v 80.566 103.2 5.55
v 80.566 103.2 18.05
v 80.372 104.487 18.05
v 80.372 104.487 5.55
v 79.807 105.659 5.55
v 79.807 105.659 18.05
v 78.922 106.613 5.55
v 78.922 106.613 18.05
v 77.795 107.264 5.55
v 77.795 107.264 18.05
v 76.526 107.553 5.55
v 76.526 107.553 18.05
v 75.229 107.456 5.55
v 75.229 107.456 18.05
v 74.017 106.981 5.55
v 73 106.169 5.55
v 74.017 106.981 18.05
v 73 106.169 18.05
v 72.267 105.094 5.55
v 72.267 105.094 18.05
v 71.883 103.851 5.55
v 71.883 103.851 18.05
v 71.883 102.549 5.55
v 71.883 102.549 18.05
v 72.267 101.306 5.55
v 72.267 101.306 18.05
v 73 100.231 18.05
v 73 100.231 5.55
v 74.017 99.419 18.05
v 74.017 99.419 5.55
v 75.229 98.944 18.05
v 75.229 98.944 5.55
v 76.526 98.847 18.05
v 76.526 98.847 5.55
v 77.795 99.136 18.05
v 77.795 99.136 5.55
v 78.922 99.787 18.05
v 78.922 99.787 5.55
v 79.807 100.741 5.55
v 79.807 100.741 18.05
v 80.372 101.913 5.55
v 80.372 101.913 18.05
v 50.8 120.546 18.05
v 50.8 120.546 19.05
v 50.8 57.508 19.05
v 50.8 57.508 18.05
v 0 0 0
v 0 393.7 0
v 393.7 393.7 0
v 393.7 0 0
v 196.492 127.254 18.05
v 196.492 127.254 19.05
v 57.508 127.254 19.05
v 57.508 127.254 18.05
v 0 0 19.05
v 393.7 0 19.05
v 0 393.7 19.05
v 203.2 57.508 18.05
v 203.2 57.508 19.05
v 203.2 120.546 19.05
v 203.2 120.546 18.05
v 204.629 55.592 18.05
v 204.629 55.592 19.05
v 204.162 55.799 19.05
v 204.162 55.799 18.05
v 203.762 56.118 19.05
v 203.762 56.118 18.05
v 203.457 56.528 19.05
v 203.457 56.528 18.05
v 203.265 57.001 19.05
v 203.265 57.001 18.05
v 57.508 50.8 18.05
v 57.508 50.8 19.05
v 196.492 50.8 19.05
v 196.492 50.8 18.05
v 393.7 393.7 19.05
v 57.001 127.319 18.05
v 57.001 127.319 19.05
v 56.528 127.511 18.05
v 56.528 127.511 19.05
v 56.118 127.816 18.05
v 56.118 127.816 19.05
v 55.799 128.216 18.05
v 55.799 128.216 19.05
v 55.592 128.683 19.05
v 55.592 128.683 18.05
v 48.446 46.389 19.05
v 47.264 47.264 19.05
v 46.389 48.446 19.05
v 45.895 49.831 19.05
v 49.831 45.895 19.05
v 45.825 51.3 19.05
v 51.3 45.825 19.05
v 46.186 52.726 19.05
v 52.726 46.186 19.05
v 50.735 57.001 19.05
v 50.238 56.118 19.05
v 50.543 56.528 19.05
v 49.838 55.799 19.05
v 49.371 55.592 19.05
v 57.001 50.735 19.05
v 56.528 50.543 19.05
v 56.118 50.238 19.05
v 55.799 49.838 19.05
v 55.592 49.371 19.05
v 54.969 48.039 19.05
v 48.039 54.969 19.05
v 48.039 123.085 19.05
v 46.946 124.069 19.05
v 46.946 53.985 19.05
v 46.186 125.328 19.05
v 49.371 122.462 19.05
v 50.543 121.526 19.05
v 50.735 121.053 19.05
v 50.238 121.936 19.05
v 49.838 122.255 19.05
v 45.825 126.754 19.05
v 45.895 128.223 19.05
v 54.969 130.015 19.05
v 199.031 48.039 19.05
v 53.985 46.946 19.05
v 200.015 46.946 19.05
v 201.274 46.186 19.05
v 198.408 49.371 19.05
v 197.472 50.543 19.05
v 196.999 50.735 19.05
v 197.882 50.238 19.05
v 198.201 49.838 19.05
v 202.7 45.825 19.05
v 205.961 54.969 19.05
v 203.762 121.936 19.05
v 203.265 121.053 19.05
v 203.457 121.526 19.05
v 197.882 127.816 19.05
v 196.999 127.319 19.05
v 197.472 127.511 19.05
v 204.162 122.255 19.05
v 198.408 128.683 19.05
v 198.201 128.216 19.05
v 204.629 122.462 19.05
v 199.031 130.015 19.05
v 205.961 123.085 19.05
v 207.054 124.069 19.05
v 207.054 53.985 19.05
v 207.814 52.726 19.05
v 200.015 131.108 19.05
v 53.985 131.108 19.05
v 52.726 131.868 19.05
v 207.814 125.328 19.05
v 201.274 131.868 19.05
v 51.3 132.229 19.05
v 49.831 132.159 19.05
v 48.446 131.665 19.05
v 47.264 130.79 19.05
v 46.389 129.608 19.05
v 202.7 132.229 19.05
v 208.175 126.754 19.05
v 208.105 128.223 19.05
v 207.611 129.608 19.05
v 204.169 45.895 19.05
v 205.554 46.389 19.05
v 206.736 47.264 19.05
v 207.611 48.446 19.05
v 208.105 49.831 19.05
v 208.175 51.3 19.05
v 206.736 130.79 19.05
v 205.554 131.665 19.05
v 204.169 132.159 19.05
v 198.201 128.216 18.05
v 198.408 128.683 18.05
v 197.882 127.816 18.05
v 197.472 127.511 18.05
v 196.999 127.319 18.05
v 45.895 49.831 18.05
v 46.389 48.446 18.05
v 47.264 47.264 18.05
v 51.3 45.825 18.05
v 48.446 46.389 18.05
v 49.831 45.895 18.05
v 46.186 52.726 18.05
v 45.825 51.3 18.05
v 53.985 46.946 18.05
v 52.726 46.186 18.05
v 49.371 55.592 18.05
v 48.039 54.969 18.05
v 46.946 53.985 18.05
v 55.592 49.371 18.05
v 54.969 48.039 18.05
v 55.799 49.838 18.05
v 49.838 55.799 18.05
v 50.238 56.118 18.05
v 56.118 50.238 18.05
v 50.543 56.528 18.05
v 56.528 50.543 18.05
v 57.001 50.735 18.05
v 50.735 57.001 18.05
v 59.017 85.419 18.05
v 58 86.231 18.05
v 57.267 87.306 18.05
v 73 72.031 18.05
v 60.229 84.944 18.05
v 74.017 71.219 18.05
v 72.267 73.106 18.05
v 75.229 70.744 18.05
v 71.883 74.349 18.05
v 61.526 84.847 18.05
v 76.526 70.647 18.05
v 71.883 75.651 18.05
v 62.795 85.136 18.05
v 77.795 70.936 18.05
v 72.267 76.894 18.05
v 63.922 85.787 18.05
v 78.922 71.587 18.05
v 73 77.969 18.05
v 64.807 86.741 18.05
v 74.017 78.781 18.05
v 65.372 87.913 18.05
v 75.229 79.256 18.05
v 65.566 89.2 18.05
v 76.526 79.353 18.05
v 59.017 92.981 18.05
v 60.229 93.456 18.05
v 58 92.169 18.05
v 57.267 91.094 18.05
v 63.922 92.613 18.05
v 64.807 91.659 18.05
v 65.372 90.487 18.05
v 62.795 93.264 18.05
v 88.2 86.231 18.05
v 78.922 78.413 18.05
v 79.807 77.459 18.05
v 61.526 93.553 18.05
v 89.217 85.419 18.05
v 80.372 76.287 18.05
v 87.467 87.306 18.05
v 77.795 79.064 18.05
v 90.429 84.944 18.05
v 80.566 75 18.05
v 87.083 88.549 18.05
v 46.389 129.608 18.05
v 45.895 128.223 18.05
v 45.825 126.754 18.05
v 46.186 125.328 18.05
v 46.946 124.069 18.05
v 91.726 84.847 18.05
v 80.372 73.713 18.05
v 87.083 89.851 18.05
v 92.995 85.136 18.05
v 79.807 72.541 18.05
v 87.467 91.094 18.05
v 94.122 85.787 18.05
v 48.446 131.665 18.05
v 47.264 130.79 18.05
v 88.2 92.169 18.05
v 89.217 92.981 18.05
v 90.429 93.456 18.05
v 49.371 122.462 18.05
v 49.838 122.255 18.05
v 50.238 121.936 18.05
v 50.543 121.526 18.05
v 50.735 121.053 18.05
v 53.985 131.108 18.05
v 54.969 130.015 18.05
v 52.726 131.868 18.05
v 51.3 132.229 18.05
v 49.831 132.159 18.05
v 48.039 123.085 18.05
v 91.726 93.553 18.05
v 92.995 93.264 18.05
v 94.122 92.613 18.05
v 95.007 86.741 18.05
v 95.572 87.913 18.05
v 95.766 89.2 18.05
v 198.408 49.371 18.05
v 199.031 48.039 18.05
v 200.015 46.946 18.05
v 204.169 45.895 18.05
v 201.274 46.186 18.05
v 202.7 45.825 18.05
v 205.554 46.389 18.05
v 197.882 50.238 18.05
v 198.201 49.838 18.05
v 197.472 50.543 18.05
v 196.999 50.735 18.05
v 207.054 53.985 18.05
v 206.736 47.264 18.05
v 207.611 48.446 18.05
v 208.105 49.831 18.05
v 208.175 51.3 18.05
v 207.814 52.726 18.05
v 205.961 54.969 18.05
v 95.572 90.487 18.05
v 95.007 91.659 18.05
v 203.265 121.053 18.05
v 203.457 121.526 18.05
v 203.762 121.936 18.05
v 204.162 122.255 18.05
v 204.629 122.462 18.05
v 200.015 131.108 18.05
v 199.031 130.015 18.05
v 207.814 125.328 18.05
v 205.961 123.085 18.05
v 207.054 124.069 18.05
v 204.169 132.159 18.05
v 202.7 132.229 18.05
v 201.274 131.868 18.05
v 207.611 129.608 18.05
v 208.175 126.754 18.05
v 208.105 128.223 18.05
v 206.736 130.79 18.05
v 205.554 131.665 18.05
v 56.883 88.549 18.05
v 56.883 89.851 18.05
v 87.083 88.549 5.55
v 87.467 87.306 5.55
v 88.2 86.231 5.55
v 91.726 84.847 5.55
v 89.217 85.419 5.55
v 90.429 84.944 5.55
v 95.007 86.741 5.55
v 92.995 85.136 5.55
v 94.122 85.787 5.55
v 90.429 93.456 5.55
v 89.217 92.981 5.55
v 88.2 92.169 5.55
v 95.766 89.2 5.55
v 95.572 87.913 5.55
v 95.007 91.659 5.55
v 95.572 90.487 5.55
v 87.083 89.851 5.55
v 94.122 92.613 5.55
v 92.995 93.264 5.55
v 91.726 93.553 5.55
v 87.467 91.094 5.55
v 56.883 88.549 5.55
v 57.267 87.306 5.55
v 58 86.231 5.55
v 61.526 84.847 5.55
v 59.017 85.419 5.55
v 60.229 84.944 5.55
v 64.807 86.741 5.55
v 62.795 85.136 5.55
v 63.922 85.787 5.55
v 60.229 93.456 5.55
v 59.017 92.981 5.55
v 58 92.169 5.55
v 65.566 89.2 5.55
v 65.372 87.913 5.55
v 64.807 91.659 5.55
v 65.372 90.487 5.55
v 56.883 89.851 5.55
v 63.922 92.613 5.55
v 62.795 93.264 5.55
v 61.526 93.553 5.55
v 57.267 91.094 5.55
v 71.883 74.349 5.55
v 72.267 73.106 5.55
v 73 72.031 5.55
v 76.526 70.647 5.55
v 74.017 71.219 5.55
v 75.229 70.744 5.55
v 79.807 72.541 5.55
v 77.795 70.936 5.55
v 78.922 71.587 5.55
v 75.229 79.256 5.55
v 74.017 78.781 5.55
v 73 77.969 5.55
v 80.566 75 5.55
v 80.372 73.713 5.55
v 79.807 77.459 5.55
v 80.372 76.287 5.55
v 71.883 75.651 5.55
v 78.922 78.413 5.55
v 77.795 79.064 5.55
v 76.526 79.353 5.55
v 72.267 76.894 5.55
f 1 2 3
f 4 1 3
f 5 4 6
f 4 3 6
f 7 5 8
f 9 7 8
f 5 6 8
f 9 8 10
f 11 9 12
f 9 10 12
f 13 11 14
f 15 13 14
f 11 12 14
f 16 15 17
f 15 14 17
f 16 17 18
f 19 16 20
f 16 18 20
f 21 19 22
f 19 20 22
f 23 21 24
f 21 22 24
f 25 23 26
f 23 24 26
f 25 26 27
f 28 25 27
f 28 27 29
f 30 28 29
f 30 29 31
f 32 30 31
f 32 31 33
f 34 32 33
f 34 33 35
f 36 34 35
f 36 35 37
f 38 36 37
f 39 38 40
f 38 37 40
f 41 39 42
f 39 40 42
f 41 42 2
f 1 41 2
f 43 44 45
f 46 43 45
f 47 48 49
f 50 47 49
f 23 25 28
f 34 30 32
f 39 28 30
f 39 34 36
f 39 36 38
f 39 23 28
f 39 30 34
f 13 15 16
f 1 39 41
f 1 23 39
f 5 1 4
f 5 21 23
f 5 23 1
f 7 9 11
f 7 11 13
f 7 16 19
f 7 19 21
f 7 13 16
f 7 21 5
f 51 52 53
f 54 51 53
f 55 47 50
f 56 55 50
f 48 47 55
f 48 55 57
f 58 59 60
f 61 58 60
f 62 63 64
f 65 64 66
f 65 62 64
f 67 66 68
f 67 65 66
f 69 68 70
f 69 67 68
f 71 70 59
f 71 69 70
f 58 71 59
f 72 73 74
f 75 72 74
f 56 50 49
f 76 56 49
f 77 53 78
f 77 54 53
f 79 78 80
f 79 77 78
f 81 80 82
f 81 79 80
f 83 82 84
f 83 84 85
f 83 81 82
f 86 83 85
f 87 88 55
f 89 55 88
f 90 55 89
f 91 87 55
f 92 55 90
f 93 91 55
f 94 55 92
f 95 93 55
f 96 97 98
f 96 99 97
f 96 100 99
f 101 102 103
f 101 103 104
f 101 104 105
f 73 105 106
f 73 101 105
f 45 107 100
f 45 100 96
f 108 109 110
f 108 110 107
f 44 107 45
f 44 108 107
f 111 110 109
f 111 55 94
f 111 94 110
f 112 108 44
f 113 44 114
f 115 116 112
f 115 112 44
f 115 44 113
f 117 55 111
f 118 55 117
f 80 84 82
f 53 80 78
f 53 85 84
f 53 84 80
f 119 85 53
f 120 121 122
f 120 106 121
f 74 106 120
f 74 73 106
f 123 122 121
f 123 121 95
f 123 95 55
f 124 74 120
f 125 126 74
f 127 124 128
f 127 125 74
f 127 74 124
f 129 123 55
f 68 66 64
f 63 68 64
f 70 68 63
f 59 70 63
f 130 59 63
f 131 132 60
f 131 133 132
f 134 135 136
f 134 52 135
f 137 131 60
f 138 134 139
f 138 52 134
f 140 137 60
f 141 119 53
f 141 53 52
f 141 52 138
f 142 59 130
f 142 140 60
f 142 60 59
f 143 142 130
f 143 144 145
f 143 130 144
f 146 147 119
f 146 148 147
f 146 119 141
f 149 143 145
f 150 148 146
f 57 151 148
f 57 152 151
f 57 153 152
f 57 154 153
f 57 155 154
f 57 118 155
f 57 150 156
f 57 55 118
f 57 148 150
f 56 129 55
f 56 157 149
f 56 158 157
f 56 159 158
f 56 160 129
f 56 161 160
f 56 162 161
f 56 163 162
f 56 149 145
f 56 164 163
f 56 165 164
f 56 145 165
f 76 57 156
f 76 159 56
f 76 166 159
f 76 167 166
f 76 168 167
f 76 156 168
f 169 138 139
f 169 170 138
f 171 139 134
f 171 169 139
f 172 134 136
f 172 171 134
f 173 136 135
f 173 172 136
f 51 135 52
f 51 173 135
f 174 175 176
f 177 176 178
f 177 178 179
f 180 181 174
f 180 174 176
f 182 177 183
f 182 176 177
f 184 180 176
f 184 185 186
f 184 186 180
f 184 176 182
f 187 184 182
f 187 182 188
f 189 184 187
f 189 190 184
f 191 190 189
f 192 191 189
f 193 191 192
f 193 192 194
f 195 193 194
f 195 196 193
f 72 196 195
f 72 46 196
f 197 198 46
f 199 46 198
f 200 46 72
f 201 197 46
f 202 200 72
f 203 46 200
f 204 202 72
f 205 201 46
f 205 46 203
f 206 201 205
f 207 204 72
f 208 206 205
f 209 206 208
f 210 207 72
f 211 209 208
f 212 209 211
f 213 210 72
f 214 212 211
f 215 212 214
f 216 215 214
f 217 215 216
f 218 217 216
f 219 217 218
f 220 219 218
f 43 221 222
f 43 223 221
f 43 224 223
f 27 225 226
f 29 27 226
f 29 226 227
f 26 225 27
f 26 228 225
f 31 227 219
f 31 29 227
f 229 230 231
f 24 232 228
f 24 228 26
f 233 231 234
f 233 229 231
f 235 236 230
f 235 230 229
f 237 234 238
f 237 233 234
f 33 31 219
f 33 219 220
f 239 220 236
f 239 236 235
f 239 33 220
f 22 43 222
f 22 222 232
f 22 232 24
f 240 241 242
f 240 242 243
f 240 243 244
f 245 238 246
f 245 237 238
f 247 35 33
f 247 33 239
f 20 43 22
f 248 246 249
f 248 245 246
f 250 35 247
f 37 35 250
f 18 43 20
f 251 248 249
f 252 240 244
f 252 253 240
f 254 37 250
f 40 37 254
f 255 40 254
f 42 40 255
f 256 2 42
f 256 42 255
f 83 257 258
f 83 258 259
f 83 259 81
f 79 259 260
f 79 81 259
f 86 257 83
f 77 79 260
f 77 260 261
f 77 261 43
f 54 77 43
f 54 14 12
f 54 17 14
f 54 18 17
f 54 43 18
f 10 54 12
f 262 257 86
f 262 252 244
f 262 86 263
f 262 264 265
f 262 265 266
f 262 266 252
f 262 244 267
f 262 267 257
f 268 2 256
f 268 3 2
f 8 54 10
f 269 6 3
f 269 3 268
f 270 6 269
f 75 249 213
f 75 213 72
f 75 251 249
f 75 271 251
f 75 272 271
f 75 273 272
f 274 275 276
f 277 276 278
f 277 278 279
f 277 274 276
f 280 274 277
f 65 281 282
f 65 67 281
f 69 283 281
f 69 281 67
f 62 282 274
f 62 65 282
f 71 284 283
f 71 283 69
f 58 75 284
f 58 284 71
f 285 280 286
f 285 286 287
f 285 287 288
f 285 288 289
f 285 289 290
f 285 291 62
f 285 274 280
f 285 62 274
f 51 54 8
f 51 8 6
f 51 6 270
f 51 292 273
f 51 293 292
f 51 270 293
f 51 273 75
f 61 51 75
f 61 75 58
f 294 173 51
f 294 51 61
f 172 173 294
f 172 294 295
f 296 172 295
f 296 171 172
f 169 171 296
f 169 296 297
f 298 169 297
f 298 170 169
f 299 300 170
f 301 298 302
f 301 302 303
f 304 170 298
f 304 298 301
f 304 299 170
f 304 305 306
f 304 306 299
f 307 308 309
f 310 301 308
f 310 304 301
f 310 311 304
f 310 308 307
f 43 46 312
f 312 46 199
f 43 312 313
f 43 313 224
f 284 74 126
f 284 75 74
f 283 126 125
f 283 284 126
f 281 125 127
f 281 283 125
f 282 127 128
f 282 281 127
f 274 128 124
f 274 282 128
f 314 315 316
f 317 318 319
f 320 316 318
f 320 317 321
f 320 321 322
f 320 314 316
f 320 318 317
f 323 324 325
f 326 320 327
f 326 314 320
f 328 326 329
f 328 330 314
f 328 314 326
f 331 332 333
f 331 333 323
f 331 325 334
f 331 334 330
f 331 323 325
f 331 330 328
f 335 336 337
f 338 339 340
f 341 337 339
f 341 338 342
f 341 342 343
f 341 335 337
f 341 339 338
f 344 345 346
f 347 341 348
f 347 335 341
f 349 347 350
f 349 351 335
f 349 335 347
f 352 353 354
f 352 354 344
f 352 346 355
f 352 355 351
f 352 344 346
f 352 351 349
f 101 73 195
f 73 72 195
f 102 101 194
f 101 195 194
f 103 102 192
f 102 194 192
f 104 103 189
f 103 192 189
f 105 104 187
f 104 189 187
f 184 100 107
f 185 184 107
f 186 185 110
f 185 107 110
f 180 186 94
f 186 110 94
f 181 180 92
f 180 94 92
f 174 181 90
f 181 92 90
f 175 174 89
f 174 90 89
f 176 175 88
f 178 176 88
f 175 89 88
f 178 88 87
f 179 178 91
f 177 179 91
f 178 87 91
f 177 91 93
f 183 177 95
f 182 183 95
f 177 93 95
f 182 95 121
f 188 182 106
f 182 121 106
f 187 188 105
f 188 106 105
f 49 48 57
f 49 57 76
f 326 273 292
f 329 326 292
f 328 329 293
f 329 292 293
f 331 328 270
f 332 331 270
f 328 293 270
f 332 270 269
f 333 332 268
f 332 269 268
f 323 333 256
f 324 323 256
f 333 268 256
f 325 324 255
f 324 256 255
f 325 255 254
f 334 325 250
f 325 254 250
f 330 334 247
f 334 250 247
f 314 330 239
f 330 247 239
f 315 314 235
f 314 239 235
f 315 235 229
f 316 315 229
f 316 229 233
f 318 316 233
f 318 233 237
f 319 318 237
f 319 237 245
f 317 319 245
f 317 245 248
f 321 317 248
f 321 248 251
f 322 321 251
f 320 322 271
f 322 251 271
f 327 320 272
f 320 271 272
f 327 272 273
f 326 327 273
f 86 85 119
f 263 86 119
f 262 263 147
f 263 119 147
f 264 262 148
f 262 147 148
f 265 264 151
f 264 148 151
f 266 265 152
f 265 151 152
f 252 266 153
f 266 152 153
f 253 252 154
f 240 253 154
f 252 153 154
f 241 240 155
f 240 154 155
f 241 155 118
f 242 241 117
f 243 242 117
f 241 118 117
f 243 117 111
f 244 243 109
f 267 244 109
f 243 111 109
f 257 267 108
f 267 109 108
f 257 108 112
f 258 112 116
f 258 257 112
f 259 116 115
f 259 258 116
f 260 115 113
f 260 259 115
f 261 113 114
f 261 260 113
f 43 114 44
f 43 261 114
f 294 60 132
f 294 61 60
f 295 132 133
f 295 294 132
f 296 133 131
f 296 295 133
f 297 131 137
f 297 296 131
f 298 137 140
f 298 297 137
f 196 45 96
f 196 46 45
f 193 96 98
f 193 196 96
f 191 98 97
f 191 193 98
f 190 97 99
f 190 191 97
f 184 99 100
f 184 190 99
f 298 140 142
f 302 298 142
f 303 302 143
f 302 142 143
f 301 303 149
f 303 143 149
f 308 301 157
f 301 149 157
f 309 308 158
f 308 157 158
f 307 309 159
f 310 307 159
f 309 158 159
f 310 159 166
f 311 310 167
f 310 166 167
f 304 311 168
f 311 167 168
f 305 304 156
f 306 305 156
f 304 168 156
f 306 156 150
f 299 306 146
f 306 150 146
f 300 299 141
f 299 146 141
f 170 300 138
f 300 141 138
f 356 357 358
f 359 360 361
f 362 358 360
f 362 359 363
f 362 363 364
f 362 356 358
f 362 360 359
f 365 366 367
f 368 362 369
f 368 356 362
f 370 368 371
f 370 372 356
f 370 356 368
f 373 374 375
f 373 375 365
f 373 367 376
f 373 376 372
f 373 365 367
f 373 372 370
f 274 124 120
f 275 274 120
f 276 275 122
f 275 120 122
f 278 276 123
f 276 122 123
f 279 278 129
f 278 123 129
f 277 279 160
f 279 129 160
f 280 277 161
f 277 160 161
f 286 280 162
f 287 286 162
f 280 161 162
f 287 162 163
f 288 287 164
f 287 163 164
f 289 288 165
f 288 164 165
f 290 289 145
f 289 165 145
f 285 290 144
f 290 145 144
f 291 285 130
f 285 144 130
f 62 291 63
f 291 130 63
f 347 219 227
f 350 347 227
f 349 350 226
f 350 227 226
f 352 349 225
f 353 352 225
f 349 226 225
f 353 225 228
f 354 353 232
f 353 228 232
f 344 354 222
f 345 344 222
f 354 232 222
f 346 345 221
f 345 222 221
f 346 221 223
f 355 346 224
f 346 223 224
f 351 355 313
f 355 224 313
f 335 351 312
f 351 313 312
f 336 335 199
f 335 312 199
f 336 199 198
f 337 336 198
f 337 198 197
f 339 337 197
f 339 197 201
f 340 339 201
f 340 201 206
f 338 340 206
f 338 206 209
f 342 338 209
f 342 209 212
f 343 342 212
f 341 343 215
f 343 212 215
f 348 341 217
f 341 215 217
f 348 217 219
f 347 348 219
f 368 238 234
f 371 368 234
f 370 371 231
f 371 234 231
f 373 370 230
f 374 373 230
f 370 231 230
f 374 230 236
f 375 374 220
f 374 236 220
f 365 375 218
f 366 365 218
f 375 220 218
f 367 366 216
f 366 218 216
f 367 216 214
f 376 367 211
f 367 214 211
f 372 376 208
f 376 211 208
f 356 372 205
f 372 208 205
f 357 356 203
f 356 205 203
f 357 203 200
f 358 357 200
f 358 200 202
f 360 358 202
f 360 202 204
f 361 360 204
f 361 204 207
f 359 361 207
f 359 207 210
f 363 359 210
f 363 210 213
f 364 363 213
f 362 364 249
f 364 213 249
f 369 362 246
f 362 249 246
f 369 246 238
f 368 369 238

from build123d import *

# Parameters (mm, degrees)
SKETCH1_W           = 393.7
SKETCH1_H           = 393.7
BOSS_EXTRUDE1_DEPTH = 19.05
CUT_EXTRUDE2_DEPTH  = 1
SKETCH3_R           = 4.365625
CUT_EXTRUDE4_DEPTH  = 12.5
FILLET1_R           = 2


with BuildPart() as part:
    # Sketch1 → Boss-Extrude1 (new body)
    with BuildSketch(Plane.XY):
        with Locations((196.85, 196.85)):
            Rectangle(SKETCH1_W, SKETCH1_H)
    extrude(amount=BOSS_EXTRUDE1_DEPTH)

    # Sketch2 → Cut-Extrude2 (cut)
    with BuildSketch(Plane.XY.offset(19.05)):
        with BuildLine():
            Line((55.8, 50.8), (198.2, 50.8))
            ThreePointArc((198.2, 50.8), (206.735533906, 47.264466094), (203.2, 55.8))
            Line((203.2, 55.8), (203.2, 122.254))
            ThreePointArc((203.2, 122.254), (206.735533906, 130.789533906), (198.2, 127.254))
            Line((198.2, 127.254), (55.8, 127.254))
            ThreePointArc((55.8, 127.254), (47.264466094, 130.789533906), (50.8, 122.254))
            Line((50.8, 122.254), (50.8, 55.8))
            ThreePointArc((50.8, 55.8), (47.264466094, 47.264466094), (55.8, 50.8))
        make_face()
    extrude(amount=-CUT_EXTRUDE2_DEPTH, mode=Mode.SUBTRACT)

    # Sketch3 → Cut-Extrude4 (cut)
    with BuildSketch(Plane.XY.offset(18.05)):
        with Locations((61.2, 89.2)):
            Circle(SKETCH3_R)
        with Locations((91.4, 89.2)):
            Circle(SKETCH3_R)
        with Locations((76.2, 75)):
            Circle(SKETCH3_R)
        with Locations((76.2, 103.2)):
            Circle(SKETCH3_R)
    extrude(amount=-CUT_EXTRUDE4_DEPTH, mode=Mode.SUBTRACT)

    # Fillet1
    fillet1_edges = [part.edges().sort_by_distance(p)[0] for p in [
        (203.2, 55.8, 18.55),
        (198.2, 50.8, 18.55),
        (55.8, 50.8, 18.55),
        (50.8, 55.8, 18.55),
        (50.8, 122.254, 18.55),
        (55.8, 127.254, 18.55),
        (198.2, 127.254, 18.55),
        (203.2, 122.254, 18.55),
    ]]
    fillet(fillet1_edges, radius=FILLET1_R)


solid = part.part
